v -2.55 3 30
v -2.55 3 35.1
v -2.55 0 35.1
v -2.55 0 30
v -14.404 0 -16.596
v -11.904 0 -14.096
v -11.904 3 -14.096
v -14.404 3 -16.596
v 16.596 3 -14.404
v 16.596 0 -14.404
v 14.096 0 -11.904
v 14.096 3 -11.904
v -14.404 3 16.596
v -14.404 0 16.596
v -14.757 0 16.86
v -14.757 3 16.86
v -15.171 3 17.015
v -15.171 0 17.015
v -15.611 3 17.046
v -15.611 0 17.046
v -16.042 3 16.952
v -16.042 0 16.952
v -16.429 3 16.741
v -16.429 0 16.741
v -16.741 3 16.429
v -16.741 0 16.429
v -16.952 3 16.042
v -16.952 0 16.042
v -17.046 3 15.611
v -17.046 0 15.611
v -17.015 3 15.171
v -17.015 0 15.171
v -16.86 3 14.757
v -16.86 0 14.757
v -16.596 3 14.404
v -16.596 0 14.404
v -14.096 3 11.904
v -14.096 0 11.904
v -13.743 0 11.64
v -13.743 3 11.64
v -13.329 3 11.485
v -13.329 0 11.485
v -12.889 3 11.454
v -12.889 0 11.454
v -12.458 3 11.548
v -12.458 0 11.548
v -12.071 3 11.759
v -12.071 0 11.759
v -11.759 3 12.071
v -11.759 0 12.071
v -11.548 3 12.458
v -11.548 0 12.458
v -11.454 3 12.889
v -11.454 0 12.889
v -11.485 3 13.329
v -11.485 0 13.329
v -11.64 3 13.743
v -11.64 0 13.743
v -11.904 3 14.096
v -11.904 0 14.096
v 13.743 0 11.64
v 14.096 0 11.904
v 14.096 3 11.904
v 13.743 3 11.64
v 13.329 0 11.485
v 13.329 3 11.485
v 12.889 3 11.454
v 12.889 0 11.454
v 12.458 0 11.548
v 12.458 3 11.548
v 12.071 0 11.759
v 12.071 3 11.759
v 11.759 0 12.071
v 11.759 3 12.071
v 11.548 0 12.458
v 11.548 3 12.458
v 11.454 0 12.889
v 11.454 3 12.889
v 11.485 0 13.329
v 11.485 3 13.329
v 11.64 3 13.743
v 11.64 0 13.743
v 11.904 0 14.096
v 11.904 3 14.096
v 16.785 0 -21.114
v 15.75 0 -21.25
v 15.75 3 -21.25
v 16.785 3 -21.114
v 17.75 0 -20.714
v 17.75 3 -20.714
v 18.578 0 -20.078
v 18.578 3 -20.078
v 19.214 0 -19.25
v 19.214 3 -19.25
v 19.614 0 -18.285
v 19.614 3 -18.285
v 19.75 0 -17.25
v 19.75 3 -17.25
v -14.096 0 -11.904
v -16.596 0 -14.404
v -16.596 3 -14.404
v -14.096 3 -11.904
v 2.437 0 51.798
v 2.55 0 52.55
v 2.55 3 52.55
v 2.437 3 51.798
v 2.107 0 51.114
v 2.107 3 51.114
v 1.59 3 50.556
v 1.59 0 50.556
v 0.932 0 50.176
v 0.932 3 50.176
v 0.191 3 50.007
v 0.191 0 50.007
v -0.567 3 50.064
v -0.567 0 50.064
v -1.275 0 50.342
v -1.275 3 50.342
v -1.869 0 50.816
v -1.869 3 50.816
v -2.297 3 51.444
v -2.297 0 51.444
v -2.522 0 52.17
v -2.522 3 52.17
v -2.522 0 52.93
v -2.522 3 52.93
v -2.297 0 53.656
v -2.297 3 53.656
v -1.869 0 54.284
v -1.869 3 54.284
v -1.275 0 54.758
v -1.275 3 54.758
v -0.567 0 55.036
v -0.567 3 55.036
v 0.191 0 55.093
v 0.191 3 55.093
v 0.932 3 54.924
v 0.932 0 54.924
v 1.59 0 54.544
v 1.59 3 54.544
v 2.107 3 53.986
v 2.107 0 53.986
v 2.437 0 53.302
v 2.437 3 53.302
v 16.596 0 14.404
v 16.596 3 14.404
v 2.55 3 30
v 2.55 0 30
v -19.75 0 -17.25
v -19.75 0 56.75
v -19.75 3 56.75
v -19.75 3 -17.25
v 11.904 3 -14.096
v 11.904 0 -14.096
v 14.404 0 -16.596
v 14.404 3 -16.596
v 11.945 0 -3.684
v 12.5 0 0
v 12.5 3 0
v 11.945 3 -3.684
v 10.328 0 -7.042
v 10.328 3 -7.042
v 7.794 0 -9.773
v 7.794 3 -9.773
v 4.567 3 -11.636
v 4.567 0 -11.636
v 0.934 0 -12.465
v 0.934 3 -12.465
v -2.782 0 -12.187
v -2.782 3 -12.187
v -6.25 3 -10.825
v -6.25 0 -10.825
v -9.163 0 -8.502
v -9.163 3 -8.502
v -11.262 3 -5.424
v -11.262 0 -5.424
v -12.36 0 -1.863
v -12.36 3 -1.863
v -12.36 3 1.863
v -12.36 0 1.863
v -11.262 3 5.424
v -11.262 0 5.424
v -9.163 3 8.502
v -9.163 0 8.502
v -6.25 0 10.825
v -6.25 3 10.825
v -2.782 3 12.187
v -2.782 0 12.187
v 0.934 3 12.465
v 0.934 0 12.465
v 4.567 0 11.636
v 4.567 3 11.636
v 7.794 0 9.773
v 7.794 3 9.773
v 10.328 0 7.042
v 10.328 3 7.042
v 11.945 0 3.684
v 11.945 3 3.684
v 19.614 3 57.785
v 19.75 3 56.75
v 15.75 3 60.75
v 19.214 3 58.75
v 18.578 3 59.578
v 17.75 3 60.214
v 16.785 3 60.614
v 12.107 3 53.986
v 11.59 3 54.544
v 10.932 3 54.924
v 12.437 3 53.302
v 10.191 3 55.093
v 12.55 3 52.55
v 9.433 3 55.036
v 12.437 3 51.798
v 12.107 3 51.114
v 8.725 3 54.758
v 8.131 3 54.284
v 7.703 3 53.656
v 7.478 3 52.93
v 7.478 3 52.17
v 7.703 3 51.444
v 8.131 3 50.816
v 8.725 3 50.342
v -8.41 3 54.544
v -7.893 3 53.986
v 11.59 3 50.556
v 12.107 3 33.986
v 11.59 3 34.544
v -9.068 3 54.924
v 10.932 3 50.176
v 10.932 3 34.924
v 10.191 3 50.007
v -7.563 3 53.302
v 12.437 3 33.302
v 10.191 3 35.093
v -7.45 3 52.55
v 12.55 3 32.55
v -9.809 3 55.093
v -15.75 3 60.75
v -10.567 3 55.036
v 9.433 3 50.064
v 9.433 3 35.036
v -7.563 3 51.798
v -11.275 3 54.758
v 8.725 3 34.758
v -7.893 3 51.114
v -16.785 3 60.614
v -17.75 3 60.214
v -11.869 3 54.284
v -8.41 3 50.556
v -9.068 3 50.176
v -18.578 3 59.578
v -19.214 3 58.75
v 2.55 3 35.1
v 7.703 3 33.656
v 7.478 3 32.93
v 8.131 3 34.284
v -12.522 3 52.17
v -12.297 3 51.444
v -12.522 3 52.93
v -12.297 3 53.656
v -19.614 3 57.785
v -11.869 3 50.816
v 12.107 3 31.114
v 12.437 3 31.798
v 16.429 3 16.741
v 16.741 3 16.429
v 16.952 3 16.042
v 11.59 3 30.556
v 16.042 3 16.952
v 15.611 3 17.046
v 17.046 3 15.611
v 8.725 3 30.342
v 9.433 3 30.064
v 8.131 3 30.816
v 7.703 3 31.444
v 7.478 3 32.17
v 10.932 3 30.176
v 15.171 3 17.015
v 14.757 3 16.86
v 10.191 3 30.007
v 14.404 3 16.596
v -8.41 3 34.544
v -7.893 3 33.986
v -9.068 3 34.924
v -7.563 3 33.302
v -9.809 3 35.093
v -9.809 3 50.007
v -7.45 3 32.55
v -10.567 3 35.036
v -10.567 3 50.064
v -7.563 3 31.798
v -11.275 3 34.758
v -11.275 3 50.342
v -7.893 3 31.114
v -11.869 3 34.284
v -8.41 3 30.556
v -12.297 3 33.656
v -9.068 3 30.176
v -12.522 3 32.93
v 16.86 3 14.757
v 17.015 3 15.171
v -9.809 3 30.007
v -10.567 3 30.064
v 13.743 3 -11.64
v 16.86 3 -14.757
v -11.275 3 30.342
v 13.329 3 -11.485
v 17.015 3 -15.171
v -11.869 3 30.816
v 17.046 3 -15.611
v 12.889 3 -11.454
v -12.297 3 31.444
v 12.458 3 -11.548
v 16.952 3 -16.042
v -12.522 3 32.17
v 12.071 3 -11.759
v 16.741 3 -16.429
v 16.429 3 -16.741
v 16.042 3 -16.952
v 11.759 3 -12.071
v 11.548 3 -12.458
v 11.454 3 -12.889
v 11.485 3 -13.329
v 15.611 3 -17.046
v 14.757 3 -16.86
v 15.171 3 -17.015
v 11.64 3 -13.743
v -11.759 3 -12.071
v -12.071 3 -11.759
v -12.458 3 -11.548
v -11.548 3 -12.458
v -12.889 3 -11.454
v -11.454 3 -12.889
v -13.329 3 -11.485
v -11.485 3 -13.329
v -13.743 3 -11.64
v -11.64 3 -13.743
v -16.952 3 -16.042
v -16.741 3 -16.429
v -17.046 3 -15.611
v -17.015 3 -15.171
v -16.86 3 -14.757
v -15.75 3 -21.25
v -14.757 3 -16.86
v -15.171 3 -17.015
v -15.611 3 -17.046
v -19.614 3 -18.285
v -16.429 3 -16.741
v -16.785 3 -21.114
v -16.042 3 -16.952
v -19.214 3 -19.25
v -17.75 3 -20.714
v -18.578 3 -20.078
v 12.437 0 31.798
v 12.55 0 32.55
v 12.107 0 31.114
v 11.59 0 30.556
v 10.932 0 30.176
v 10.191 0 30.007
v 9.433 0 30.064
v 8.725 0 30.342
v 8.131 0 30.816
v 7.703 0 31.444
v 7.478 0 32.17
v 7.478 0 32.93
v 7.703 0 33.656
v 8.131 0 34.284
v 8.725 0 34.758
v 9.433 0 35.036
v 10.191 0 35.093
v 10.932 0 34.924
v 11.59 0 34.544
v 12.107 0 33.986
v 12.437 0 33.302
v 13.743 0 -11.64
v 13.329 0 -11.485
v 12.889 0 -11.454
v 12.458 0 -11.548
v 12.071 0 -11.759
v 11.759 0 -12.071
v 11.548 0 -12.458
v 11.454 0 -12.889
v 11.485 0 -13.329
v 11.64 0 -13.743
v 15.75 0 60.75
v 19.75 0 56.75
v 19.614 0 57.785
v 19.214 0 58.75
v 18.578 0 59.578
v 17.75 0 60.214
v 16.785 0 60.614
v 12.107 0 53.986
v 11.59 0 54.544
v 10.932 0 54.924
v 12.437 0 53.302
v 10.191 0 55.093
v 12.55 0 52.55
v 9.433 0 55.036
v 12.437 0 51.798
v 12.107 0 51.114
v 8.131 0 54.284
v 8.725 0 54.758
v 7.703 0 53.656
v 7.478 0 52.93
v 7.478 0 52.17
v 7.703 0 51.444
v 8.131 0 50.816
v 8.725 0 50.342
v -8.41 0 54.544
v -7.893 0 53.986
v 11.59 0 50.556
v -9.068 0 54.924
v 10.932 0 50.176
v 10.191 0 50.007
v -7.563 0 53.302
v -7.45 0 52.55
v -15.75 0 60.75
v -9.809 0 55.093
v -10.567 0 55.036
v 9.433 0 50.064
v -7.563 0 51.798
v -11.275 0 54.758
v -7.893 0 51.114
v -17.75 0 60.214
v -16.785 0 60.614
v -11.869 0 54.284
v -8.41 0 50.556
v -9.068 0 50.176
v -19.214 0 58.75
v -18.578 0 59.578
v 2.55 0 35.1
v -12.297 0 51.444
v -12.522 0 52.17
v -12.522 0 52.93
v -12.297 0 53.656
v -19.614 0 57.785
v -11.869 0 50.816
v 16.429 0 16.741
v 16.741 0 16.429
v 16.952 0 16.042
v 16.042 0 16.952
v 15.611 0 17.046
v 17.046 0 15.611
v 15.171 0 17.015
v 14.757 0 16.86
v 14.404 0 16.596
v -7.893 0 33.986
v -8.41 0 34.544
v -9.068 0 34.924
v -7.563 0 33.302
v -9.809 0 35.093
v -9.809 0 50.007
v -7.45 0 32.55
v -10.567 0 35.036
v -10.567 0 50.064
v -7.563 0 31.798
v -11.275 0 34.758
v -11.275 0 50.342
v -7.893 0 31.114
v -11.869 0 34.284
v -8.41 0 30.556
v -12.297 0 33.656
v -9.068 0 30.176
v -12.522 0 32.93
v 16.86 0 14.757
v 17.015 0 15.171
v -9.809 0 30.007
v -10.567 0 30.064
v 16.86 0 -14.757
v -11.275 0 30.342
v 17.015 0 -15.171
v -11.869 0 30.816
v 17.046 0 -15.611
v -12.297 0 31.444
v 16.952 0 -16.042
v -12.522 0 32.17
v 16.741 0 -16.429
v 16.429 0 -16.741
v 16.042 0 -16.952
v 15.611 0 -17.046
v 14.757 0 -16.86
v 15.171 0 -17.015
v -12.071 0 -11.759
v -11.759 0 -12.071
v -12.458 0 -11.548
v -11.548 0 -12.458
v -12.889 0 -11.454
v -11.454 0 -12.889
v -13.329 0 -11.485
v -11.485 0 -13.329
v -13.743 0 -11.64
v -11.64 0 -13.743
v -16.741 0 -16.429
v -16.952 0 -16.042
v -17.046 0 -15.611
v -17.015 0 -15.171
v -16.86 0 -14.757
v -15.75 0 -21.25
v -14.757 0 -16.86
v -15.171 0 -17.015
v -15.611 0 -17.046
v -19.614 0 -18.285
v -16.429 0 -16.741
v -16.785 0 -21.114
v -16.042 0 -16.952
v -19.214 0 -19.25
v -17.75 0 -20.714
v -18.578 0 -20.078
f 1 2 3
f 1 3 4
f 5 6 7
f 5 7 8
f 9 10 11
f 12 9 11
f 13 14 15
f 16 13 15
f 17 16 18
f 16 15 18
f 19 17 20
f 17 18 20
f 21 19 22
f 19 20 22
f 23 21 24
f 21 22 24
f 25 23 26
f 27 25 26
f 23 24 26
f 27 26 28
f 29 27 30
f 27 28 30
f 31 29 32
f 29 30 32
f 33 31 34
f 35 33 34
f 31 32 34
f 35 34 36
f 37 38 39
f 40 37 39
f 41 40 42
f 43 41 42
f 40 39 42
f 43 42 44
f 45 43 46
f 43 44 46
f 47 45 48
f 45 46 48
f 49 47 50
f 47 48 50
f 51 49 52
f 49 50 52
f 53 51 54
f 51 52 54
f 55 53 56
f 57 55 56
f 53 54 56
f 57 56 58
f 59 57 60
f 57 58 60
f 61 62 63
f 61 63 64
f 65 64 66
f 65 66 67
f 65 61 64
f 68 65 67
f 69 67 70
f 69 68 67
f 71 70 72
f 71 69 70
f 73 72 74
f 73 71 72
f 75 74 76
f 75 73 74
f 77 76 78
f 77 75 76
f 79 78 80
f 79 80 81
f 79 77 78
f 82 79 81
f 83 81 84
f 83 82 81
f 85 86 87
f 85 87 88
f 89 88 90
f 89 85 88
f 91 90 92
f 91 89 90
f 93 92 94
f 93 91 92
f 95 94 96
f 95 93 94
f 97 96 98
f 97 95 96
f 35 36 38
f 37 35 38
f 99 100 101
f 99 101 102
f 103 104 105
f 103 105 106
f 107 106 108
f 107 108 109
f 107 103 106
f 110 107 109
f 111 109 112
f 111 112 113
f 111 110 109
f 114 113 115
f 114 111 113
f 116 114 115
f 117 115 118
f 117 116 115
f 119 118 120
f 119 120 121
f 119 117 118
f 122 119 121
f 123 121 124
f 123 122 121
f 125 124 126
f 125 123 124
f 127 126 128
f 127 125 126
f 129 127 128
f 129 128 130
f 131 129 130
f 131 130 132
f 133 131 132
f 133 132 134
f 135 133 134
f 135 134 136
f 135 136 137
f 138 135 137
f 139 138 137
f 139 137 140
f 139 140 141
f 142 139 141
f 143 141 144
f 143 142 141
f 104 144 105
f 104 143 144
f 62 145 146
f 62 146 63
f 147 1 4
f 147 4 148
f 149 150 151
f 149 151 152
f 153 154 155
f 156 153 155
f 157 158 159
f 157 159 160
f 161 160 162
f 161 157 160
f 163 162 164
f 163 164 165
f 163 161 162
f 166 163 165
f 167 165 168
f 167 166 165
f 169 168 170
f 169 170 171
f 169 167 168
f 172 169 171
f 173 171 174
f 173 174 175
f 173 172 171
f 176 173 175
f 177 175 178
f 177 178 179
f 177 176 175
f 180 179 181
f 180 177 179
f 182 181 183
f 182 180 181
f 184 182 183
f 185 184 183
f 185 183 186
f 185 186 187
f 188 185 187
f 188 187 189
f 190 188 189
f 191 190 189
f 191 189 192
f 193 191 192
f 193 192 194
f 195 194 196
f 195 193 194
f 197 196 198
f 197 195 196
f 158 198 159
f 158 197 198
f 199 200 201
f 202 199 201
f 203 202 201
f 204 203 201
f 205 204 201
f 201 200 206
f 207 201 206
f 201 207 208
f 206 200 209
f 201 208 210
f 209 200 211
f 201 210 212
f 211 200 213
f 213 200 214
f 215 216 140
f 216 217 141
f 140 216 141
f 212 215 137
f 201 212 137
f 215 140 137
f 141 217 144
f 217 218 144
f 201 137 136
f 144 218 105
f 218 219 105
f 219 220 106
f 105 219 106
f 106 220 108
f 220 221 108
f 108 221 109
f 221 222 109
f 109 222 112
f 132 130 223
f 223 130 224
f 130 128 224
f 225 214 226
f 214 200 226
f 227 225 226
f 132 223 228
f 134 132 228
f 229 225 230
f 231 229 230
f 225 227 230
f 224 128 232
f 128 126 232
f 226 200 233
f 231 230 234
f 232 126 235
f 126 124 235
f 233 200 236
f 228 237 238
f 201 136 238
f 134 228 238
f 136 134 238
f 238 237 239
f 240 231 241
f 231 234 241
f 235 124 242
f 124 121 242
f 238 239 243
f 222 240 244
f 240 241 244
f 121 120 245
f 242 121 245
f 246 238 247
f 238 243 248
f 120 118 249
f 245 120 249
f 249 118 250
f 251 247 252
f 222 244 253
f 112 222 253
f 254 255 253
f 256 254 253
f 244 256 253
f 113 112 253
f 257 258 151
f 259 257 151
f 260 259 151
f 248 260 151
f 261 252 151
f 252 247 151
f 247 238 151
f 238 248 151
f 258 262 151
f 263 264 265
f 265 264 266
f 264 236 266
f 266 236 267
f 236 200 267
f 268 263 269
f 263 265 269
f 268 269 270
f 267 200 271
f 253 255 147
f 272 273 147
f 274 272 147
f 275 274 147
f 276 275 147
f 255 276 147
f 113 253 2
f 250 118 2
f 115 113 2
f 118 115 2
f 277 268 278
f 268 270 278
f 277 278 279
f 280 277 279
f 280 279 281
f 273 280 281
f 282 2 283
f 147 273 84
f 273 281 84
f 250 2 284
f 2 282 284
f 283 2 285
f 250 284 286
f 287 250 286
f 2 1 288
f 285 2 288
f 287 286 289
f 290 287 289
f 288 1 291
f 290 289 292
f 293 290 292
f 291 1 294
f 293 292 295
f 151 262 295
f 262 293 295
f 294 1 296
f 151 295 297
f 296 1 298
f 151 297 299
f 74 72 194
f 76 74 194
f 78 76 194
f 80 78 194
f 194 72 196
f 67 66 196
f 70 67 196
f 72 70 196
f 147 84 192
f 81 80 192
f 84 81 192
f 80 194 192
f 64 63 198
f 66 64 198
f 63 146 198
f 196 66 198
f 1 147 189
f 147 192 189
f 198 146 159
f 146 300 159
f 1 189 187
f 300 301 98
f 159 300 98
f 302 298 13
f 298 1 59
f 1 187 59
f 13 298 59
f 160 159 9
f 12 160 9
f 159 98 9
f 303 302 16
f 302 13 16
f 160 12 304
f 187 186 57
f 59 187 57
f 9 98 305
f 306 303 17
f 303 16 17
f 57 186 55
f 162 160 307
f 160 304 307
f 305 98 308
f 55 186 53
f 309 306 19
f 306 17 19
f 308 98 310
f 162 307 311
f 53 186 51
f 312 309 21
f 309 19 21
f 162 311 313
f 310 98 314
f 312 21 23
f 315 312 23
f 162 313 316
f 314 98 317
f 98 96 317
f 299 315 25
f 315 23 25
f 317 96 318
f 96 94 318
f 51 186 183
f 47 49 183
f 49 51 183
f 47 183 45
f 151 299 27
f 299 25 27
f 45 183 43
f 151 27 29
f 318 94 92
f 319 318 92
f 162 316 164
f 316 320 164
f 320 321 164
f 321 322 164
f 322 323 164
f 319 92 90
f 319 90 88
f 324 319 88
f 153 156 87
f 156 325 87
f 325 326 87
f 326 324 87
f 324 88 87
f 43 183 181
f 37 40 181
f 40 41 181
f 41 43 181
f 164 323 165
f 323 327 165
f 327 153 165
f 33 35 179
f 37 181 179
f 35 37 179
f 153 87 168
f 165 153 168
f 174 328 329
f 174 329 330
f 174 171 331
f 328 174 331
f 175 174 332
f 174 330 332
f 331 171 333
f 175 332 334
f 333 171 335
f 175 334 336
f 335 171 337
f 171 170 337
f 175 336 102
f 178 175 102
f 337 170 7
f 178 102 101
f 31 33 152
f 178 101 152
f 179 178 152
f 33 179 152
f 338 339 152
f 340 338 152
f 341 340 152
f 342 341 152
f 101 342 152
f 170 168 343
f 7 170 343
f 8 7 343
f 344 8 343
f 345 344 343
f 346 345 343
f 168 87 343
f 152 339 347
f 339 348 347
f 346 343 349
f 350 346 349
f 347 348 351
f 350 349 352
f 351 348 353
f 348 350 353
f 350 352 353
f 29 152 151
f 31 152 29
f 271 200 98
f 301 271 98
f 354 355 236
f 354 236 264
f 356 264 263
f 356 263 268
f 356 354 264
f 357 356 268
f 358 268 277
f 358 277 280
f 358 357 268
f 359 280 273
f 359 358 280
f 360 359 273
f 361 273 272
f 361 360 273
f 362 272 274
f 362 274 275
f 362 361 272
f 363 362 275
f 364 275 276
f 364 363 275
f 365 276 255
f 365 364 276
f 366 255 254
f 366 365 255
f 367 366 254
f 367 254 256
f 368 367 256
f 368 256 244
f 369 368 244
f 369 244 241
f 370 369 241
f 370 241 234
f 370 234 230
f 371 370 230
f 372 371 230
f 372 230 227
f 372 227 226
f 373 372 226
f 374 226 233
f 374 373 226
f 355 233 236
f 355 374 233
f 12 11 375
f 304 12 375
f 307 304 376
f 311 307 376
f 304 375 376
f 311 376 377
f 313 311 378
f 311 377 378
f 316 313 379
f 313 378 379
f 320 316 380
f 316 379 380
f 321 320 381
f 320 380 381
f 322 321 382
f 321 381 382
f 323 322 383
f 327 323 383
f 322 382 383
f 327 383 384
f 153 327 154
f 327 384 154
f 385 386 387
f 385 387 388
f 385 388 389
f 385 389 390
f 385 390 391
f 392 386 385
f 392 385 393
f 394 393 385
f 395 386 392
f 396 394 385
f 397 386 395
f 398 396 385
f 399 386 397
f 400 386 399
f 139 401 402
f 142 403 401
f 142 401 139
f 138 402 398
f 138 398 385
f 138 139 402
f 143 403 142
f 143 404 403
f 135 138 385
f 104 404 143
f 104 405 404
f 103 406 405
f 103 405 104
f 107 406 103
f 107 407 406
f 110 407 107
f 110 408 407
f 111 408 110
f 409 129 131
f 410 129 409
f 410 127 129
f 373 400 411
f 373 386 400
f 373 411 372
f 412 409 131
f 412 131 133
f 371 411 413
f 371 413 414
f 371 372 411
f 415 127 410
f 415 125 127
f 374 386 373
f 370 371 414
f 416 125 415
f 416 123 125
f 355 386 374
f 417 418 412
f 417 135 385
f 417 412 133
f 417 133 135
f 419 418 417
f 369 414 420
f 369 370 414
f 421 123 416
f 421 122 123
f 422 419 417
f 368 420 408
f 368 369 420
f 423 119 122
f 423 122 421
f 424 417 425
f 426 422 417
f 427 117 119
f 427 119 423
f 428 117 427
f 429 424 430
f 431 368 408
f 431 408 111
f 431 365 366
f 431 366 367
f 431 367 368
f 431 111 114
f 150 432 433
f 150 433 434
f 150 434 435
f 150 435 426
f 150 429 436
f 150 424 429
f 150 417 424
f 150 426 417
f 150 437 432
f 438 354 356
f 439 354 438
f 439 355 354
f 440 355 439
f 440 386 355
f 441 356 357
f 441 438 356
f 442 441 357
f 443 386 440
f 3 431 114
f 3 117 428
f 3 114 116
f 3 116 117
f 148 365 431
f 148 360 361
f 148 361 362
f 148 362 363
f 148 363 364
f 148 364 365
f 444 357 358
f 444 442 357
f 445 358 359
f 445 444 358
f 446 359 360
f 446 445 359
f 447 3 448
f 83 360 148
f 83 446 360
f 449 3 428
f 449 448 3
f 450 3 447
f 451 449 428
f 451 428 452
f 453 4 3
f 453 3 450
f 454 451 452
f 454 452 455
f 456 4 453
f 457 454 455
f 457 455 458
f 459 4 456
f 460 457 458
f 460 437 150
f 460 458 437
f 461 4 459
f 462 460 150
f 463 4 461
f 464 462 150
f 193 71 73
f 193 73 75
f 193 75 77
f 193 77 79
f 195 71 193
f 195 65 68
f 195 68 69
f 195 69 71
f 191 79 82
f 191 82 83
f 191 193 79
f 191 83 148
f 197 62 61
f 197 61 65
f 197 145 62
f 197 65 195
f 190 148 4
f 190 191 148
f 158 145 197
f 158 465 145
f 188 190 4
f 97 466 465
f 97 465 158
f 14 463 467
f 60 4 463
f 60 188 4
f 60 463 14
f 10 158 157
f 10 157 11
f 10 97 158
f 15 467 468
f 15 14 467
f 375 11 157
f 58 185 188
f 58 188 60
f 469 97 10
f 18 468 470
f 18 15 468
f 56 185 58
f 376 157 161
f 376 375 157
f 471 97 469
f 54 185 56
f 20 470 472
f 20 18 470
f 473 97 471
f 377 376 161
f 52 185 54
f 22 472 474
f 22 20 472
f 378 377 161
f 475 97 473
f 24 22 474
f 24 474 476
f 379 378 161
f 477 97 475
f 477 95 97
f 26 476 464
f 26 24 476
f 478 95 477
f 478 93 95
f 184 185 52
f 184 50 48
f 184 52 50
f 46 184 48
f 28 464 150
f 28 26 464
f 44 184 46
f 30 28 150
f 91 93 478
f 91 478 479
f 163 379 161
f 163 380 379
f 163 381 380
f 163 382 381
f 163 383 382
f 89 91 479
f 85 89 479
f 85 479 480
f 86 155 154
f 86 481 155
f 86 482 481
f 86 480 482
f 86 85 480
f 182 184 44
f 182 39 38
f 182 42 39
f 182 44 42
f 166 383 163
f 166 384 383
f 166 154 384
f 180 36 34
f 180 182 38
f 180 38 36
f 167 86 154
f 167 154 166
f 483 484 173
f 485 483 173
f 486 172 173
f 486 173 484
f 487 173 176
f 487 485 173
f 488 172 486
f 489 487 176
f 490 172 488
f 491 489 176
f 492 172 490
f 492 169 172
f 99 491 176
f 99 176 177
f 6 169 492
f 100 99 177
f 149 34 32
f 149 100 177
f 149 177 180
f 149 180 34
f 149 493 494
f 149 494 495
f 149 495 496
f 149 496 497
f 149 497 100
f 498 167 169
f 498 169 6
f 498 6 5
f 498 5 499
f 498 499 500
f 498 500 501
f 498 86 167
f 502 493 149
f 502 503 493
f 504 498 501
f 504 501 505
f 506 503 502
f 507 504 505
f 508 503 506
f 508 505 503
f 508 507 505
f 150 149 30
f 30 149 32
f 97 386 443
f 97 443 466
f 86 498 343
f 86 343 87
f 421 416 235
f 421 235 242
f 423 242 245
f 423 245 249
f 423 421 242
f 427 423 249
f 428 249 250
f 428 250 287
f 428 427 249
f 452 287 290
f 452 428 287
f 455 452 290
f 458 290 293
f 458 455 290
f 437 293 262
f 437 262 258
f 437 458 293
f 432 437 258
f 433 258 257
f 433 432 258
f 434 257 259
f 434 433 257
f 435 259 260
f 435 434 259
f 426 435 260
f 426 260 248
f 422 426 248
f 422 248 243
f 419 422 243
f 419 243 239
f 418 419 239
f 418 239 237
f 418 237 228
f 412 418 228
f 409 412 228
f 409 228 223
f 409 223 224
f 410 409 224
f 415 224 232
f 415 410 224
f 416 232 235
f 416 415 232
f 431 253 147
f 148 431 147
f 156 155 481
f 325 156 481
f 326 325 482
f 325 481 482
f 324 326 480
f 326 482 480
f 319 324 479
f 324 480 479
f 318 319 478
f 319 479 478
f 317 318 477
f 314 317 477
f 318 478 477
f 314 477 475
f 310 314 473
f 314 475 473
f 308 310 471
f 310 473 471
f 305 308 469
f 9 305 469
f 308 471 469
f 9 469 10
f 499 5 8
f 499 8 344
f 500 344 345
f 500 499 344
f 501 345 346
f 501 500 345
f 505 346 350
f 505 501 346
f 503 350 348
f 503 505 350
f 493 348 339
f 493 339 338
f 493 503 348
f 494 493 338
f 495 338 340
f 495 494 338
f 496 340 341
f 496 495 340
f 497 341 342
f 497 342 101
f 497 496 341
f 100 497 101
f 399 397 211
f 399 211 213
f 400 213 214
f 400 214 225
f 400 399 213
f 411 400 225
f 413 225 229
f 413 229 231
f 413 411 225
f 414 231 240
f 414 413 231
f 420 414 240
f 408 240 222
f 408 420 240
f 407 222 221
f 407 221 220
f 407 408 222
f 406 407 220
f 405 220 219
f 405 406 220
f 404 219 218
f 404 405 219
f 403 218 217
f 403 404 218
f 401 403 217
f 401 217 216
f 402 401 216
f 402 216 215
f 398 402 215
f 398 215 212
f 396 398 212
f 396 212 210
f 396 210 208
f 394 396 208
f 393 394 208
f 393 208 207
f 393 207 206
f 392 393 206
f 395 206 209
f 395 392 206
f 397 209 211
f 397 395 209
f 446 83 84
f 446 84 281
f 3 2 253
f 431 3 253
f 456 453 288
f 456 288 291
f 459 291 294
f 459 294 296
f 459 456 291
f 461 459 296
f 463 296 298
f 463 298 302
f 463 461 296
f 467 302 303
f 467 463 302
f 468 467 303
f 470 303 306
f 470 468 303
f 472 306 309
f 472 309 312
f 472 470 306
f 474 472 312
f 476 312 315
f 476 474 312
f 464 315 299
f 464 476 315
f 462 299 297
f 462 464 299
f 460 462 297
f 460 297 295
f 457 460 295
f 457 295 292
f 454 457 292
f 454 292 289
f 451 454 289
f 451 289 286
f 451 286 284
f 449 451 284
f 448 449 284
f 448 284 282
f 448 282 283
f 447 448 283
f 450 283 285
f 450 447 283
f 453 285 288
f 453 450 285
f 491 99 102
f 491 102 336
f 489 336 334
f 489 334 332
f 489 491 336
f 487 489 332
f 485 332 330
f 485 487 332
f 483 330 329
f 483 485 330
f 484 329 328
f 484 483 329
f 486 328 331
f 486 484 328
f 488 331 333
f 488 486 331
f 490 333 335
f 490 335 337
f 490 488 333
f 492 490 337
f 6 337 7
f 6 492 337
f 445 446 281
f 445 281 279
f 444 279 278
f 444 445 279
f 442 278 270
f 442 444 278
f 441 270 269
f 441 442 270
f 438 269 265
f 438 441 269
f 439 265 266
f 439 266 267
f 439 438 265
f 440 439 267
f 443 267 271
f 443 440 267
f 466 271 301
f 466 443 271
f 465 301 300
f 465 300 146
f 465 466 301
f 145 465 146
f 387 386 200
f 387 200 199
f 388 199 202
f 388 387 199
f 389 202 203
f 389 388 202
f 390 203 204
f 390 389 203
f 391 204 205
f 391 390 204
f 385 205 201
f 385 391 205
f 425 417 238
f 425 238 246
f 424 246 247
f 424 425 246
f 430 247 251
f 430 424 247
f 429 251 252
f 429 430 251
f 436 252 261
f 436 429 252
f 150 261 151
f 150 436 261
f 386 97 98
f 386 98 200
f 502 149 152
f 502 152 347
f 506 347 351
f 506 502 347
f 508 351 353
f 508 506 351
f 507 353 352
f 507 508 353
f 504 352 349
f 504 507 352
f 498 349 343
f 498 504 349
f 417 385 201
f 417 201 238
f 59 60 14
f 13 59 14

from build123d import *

# Parameters (mm, degrees)
SKETCH1_R           = 12.5
SKETCH1_R_2         = 2.55
BOSS_EXTRUDE1_DEPTH = 3
SKETCH2_W           = 5.1
SKETCH2_H           = 5.1
CUT_EXTRUDE1_DEPTH  = 4


with BuildPart() as part:
    # Sketch1 → Boss-Extrude1 (new body)
    with BuildSketch(Plane(origin=(0, 0, 0), x_dir=(1, 0, 0), z_dir=(0, 1, 0))):
        with BuildLine():
            Line((15.75, -60.75), (-15.75, -60.75))
            ThreePointArc((-15.75, -60.75), (-18.578427125, -59.578427125), (-19.75, -56.75))
            Line((-19.75, -56.75), (-19.75, 17.25))
            ThreePointArc((-19.75, 17.25), (-18.578427125, 20.078427125), (-15.75, 21.25))
            Line((-15.75, 21.25), (15.75, 21.25))
            ThreePointArc((15.75, 21.25), (18.578427125, 20.078427125), (19.75, 17.25))
            Line((19.75, 17.25), (19.75, -56.75))
            ThreePointArc((19.75, -56.75), (18.578427125, -59.578427125), (15.75, -60.75))
        make_face()
        Circle(SKETCH1_R, mode=Mode.SUBTRACT)
        with Locations((10, -52.55)):
            Circle(SKETCH1_R_2, mode=Mode.SUBTRACT)
        with Locations((10, -32.55)):
            Circle(SKETCH1_R_2, mode=Mode.SUBTRACT)
        with Locations((0, -52.55)):
            Circle(SKETCH1_R_2, mode=Mode.SUBTRACT)
        with Locations((0, -32.55)):
            Circle(SKETCH1_R_2, mode=Mode.SUBTRACT)
        with Locations((-10, -52.55)):
            Circle(SKETCH1_R_2, mode=Mode.SUBTRACT)
        with Locations((-10, -32.55)):
            Circle(SKETCH1_R_2, mode=Mode.SUBTRACT)
        with BuildLine():
            Line((11.903984489, 14.096015511), (14.403984489, 16.596015511))
            ThreePointArc((14.403984489, 16.596015511), (16.596015511, 16.596015511), (16.596015511, 14.403984489))
            Line((16.596015511, 14.403984489), (14.096015511, 11.903984489))
            ThreePointArc((14.096015511, 11.903984489), (11.903984489, 11.903984489), (11.903984489, 14.096015511))
        make_face(mode=Mode.SUBTRACT)
        with BuildLine():
            Line((-11.903984489, 14.096015511), (-14.403984489, 16.596015511))
            ThreePointArc((-14.403984489, 16.596015511), (-16.596015511, 16.596015511), (-16.596015511, 14.403984489))
            Line((-16.596015511, 14.403984489), (-14.096015511, 11.903984489))
            ThreePointArc((-14.096015511, 11.903984489), (-11.903984489, 11.903984489), (-11.903984489, 14.096015511))
        make_face(mode=Mode.SUBTRACT)
        with BuildLine():
            Line((-11.903984489, -14.096015511), (-14.403984489, -16.596015511))
            ThreePointArc((-14.403984489, -16.596015511), (-16.596015511, -16.596015511), (-16.596015511, -14.403984489))
            Line((-16.596015511, -14.403984489), (-14.096015511, -11.903984489))
            ThreePointArc((-14.096015511, -11.903984489), (-11.903984489, -11.903984489), (-11.903984489, -14.096015511))
        make_face(mode=Mode.SUBTRACT)
        with BuildLine():
            Line((11.903984489, -14.096015511), (14.403984489, -16.596015511))
            ThreePointArc((14.403984489, -16.596015511), (16.596015511, -16.596015511), (16.596015511, -14.403984489))
            Line((16.596015511, -14.403984489), (14.096015511, -11.903984489))
            ThreePointArc((14.096015511, -11.903984489), (11.903984489, -11.903984489), (11.903984489, -14.096015511))
        make_face(mode=Mode.SUBTRACT)
    extrude(amount=BOSS_EXTRUDE1_DEPTH)

    # Sketch2 → Cut-Extrude1 (cut, through all)
    with BuildSketch(Plane(origin=(0, 3, 0), x_dir=(1, 0, 0), z_dir=(0, 1, 0))):
        with Locations((0, -32.55)):
            Rectangle(SKETCH2_W, SKETCH2_H)
    extrude(amount=-CUT_EXTRUDE1_DEPTH, mode=Mode.SUBTRACT)


solid = part.part
